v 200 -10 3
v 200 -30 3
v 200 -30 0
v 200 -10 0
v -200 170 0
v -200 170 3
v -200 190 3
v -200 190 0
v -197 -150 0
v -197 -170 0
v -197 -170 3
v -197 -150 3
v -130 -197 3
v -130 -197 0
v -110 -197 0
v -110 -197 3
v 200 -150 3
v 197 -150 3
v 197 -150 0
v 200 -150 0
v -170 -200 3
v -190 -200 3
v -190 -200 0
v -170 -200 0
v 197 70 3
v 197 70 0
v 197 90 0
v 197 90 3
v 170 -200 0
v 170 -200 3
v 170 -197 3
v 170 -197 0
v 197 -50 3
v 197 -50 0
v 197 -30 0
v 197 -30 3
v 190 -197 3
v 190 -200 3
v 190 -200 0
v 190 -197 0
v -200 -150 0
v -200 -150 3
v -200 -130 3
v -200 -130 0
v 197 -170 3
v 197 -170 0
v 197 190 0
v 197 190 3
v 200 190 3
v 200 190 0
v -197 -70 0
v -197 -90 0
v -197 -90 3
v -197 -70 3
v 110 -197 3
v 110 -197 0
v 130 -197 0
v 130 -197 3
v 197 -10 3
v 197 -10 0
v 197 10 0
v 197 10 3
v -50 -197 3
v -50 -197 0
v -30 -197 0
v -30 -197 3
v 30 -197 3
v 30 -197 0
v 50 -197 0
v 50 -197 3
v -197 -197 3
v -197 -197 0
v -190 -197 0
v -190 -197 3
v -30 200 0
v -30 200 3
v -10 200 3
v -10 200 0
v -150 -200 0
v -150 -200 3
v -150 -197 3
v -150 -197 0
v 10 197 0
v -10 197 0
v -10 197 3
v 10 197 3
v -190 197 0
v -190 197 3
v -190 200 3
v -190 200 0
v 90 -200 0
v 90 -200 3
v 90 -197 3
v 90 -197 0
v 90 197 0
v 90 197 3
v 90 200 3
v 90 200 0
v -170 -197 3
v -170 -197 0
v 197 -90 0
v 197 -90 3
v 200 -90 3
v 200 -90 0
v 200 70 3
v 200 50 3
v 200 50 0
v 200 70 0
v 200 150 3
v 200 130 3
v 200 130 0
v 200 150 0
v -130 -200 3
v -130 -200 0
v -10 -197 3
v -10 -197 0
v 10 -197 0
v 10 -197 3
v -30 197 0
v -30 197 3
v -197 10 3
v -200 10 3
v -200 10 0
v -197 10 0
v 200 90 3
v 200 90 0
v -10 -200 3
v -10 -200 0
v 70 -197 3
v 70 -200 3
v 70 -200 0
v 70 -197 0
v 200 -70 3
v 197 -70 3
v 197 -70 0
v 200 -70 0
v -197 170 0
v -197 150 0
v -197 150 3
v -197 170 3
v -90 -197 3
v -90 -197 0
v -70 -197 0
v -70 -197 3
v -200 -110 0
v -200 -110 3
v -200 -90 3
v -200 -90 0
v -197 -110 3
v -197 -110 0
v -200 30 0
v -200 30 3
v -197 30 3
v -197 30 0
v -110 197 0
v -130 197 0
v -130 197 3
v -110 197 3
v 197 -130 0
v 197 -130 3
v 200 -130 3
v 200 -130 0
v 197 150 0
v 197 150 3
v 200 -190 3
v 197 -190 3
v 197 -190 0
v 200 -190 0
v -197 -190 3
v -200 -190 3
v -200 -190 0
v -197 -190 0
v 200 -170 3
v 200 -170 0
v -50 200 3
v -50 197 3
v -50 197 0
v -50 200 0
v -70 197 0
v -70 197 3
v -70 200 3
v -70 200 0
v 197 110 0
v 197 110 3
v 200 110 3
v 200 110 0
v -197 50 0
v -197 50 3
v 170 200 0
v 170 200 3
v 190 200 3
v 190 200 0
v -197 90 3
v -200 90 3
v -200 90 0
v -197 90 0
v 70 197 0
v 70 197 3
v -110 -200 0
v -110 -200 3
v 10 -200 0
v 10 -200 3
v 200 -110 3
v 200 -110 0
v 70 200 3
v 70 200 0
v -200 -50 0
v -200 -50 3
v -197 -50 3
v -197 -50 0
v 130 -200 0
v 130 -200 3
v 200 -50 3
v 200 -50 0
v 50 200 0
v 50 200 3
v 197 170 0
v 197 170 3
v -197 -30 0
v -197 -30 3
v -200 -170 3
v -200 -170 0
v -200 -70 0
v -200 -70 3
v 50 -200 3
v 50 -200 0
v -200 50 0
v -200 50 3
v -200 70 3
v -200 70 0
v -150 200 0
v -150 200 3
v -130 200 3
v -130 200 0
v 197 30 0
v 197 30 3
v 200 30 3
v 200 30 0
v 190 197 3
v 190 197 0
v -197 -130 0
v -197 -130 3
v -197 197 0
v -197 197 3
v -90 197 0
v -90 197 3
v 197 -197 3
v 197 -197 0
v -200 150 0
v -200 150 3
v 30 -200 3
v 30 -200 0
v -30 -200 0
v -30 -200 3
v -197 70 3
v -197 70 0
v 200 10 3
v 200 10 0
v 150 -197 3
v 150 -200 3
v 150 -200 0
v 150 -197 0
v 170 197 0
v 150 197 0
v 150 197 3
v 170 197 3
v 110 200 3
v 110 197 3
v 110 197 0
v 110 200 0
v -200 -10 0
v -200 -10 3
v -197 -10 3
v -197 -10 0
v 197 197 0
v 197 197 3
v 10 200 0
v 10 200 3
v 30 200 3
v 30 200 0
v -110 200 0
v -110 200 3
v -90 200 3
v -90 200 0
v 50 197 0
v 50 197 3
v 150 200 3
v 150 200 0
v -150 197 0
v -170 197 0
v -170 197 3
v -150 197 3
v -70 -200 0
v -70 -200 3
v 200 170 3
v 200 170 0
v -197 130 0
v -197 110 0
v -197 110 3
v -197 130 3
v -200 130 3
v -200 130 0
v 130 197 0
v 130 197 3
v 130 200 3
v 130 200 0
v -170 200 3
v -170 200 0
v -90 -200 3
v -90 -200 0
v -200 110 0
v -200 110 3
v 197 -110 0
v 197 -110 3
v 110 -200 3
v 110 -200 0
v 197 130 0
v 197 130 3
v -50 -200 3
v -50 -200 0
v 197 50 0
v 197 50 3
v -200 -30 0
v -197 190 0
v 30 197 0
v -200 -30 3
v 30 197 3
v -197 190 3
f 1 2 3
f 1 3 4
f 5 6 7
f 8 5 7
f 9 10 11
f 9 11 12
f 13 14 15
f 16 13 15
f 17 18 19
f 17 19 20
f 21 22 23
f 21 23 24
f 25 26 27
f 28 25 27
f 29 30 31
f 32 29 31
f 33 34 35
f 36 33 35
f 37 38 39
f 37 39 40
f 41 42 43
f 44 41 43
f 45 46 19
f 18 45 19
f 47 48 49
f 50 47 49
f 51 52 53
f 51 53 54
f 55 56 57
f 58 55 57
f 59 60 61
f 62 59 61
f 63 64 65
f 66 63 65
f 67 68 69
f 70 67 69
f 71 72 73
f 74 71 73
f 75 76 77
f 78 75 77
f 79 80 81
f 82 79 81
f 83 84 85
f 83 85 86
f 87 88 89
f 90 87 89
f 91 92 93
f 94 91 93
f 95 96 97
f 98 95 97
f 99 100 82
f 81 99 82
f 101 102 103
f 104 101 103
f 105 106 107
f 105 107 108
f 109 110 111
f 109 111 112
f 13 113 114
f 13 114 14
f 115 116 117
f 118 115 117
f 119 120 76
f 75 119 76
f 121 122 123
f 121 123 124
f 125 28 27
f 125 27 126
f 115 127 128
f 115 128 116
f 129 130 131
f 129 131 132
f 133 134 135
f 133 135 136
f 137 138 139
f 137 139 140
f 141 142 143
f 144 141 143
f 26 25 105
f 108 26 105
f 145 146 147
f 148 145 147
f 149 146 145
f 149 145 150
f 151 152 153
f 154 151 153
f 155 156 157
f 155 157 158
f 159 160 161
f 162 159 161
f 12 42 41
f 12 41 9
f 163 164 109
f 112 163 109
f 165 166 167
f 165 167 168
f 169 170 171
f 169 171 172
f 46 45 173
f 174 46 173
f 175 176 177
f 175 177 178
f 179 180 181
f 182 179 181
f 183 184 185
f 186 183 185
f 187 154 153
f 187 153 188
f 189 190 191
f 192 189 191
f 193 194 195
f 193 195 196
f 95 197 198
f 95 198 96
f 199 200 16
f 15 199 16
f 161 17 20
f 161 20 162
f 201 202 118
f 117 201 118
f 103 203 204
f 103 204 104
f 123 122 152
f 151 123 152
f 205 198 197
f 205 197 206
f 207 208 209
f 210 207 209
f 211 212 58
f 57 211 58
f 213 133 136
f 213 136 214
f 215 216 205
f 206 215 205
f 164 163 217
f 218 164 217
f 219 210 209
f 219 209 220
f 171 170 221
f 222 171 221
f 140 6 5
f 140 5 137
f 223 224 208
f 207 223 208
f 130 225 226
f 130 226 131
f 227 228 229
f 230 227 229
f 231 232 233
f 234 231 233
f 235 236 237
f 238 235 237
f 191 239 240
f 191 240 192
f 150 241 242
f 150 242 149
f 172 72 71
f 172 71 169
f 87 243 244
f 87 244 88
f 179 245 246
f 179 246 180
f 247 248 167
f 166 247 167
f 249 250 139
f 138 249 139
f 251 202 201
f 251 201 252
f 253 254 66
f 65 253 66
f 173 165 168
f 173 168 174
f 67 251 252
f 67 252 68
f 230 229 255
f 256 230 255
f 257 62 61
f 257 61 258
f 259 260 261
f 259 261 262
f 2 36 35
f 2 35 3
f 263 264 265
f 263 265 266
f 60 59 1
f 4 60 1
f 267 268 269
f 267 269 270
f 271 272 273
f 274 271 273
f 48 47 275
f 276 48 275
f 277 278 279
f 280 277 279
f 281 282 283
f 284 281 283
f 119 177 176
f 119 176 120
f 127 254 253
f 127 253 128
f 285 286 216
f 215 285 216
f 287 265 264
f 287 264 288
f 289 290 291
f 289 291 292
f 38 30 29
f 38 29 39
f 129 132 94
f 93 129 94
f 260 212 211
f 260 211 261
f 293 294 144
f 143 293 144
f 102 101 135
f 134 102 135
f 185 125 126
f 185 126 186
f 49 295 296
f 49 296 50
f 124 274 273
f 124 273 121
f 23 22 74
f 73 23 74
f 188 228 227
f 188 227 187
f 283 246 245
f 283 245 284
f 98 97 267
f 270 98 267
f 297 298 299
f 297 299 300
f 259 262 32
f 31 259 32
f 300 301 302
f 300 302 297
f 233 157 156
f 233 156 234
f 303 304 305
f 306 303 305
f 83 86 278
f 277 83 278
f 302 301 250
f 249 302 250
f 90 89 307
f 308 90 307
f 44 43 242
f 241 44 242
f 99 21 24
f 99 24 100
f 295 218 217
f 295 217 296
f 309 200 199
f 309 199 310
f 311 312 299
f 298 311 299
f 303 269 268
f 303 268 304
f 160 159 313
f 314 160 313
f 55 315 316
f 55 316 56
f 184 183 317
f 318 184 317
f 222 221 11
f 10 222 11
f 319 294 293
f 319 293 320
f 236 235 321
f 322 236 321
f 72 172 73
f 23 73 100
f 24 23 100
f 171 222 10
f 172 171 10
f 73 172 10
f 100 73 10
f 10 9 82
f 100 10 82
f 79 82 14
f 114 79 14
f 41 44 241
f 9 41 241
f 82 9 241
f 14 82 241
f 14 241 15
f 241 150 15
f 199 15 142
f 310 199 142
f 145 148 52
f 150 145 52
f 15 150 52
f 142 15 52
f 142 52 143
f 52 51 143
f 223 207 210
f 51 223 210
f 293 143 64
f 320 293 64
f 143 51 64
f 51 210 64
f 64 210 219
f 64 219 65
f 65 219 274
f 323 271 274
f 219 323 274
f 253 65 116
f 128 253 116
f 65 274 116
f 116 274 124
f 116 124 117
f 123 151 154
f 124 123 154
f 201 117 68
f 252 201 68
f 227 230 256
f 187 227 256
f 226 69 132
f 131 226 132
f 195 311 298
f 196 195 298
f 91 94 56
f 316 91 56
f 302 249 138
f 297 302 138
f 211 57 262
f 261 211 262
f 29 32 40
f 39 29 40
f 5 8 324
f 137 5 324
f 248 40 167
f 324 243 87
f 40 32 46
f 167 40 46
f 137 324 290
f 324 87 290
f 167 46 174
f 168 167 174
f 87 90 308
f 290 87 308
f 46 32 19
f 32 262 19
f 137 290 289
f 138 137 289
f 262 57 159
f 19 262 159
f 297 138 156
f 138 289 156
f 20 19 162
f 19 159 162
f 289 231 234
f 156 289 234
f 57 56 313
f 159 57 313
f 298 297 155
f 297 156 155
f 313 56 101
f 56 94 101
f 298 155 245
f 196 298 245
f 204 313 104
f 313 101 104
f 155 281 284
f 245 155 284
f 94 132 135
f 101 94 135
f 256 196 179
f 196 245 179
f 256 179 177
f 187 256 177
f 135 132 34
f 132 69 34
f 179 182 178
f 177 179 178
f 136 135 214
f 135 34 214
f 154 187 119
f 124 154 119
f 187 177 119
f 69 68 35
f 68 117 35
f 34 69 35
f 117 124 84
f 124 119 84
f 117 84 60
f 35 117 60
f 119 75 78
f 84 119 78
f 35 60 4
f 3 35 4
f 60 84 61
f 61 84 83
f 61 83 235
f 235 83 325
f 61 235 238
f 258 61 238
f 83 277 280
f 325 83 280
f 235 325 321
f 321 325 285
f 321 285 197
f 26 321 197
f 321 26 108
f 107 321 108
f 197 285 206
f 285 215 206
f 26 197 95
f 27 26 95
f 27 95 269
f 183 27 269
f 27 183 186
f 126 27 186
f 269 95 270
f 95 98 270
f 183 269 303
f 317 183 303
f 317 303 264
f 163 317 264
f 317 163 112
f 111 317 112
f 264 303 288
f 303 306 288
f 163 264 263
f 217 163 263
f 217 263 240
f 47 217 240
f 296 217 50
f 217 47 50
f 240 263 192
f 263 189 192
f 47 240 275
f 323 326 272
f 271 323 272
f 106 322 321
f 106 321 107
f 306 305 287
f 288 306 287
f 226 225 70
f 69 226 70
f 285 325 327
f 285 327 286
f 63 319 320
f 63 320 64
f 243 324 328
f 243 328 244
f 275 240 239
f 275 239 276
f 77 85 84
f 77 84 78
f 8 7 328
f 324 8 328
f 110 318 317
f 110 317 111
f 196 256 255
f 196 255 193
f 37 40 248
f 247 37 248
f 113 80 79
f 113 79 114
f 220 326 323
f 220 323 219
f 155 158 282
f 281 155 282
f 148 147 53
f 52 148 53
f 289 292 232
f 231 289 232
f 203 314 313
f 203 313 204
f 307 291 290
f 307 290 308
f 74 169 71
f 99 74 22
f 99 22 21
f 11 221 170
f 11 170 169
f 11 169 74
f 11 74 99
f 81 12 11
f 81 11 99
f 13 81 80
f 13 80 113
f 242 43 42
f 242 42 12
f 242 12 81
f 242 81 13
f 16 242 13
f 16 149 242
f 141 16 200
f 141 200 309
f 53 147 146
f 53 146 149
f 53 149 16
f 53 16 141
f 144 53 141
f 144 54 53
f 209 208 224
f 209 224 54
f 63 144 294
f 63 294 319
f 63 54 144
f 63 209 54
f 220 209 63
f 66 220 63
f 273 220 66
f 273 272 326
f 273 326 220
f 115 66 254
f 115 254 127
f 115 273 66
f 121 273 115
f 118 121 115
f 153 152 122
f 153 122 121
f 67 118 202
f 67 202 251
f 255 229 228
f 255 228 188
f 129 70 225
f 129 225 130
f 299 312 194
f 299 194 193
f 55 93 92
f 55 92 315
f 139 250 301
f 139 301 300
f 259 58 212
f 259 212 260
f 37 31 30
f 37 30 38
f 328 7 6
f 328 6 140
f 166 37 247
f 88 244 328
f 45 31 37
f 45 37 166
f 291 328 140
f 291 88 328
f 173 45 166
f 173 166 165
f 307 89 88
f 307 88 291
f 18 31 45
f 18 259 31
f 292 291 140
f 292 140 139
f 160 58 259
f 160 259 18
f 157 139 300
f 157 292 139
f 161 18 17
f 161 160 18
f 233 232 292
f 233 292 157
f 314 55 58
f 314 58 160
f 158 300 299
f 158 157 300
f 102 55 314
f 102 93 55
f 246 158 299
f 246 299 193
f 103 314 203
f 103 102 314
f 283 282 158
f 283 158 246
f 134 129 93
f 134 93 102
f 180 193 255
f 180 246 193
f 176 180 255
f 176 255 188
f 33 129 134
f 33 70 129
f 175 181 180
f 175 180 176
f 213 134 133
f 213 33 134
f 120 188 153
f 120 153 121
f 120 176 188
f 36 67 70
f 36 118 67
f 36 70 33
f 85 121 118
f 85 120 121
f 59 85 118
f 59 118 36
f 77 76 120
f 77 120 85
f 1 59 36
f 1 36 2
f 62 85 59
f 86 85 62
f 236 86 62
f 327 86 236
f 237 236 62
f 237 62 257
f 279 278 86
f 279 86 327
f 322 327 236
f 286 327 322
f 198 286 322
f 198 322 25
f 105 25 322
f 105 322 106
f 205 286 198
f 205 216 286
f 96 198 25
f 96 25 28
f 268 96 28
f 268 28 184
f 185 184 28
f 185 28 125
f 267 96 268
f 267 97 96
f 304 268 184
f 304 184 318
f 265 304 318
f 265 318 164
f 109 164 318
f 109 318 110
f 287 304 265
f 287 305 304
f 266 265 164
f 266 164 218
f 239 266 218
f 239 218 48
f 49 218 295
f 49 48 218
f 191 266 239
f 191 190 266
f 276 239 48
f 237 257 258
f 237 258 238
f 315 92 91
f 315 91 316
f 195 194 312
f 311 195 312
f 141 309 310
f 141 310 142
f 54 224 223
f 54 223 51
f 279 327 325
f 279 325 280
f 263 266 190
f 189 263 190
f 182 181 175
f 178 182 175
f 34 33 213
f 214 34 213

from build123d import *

# Parameters (mm, degrees)
F0_W     = 394
F0_H     = 394
F1_DEPTH = 3
F2_W     = 20
F2_H     = 3
F2_W_2   = 3
F2_H_2   = 20
F3_DEPTH = 3


with BuildPart() as f1:
    # F0 (on Top) → F1 (new body)
    with BuildSketch(Plane.XY):
        Rectangle(F0_W, F0_H)
    extrude(amount=F1_DEPTH)

    # F2 (on face) → F3 (join, through all)
    with BuildSketch(Plane.XY.offset(3)):
        with Locations((-180, -198.5)):
            Rectangle(F2_W, F2_H)
        with Locations((-140, -198.5)):
            Rectangle(F2_W, F2_H)
        with Locations((-100, -198.5)):
            Rectangle(F2_W, F2_H)
        with Locations((-60, -198.5)):
            Rectangle(F2_W, F2_H)
        with Locations((-20, -198.5)):
            Rectangle(F2_W, F2_H)
        with Locations((20, -198.5)):
            Rectangle(F2_W, F2_H)
        with Locations((60, -198.5)):
            Rectangle(F2_W, F2_H)
        with Locations((100, -198.5)):
            Rectangle(F2_W, F2_H)
        with Locations((140, -198.5)):
            Rectangle(F2_W, F2_H)
        with Locations((180, -198.5)):
            Rectangle(F2_W, F2_H)
        with Locations((198.5, 20)):
            Rectangle(F2_W_2, F2_H_2)
        with Locations((198.5, 180)):
            Rectangle(F2_W_2, F2_H_2)
        with Locations((198.5, -100)):
            Rectangle(F2_W_2, F2_H_2)
        with Locations((198.5, -140)):
            Rectangle(F2_W_2, F2_H_2)
        with Locations((198.5, 60)):
            Rectangle(F2_W_2, F2_H_2)
        with Locations((198.5, -20)):
            Rectangle(F2_W_2, F2_H_2)
        with Locations((198.5, 140)):
            Rectangle(F2_W_2, F2_H_2)
        with Locations((198.5, -60)):
            Rectangle(F2_W_2, F2_H_2)
        with Locations((198.5, 100)):
            Rectangle(F2_W_2, F2_H_2)
        with Locations((198.5, -180)):
            Rectangle(F2_W_2, F2_H_2)
        with Locations((-20, 198.5)):
            Rectangle(F2_W, F2_H)
        with Locations((-180, 198.5)):
            Rectangle(F2_W, F2_H)
        with Locations((100, 198.5)):
            Rectangle(F2_W, F2_H)
        with Locations((140, 198.5)):
            Rectangle(F2_W, F2_H)
        with Locations((-60, 198.5)):
            Rectangle(F2_W, F2_H)
        with Locations((20, 198.5)):
            Rectangle(F2_W, F2_H)
        with Locations((-140, 198.5)):
            Rectangle(F2_W, F2_H)
        with Locations((60, 198.5)):
            Rectangle(F2_W, F2_H)
        with Locations((-100, 198.5)):
            Rectangle(F2_W, F2_H)
        with Locations((180, 198.5)):
            Rectangle(F2_W, F2_H)
        with Locations((-198.5, -20)):
            Rectangle(F2_W_2, F2_H_2)
        with Locations((-198.5, -180)):
            Rectangle(F2_W_2, F2_H_2)
        with Locations((-198.5, 100)):
            Rectangle(F2_W_2, F2_H_2)
        with Locations((-198.5, 140)):
            Rectangle(F2_W_2, F2_H_2)
        with Locations((-198.5, -60)):
            Rectangle(F2_W_2, F2_H_2)
        with Locations((-198.5, 20)):
            Rectangle(F2_W_2, F2_H_2)
        with Locations((-198.5, -140)):
            Rectangle(F2_W_2, F2_H_2)
        with Locations((-198.5, 60)):
            Rectangle(F2_W_2, F2_H_2)
        with Locations((-198.5, -100)):
            Rectangle(F2_W_2, F2_H_2)
        with Locations((-198.5, 180)):
            Rectangle(F2_W_2, F2_H_2)
    extrude(amount=-F3_DEPTH)


solid = f1.part
